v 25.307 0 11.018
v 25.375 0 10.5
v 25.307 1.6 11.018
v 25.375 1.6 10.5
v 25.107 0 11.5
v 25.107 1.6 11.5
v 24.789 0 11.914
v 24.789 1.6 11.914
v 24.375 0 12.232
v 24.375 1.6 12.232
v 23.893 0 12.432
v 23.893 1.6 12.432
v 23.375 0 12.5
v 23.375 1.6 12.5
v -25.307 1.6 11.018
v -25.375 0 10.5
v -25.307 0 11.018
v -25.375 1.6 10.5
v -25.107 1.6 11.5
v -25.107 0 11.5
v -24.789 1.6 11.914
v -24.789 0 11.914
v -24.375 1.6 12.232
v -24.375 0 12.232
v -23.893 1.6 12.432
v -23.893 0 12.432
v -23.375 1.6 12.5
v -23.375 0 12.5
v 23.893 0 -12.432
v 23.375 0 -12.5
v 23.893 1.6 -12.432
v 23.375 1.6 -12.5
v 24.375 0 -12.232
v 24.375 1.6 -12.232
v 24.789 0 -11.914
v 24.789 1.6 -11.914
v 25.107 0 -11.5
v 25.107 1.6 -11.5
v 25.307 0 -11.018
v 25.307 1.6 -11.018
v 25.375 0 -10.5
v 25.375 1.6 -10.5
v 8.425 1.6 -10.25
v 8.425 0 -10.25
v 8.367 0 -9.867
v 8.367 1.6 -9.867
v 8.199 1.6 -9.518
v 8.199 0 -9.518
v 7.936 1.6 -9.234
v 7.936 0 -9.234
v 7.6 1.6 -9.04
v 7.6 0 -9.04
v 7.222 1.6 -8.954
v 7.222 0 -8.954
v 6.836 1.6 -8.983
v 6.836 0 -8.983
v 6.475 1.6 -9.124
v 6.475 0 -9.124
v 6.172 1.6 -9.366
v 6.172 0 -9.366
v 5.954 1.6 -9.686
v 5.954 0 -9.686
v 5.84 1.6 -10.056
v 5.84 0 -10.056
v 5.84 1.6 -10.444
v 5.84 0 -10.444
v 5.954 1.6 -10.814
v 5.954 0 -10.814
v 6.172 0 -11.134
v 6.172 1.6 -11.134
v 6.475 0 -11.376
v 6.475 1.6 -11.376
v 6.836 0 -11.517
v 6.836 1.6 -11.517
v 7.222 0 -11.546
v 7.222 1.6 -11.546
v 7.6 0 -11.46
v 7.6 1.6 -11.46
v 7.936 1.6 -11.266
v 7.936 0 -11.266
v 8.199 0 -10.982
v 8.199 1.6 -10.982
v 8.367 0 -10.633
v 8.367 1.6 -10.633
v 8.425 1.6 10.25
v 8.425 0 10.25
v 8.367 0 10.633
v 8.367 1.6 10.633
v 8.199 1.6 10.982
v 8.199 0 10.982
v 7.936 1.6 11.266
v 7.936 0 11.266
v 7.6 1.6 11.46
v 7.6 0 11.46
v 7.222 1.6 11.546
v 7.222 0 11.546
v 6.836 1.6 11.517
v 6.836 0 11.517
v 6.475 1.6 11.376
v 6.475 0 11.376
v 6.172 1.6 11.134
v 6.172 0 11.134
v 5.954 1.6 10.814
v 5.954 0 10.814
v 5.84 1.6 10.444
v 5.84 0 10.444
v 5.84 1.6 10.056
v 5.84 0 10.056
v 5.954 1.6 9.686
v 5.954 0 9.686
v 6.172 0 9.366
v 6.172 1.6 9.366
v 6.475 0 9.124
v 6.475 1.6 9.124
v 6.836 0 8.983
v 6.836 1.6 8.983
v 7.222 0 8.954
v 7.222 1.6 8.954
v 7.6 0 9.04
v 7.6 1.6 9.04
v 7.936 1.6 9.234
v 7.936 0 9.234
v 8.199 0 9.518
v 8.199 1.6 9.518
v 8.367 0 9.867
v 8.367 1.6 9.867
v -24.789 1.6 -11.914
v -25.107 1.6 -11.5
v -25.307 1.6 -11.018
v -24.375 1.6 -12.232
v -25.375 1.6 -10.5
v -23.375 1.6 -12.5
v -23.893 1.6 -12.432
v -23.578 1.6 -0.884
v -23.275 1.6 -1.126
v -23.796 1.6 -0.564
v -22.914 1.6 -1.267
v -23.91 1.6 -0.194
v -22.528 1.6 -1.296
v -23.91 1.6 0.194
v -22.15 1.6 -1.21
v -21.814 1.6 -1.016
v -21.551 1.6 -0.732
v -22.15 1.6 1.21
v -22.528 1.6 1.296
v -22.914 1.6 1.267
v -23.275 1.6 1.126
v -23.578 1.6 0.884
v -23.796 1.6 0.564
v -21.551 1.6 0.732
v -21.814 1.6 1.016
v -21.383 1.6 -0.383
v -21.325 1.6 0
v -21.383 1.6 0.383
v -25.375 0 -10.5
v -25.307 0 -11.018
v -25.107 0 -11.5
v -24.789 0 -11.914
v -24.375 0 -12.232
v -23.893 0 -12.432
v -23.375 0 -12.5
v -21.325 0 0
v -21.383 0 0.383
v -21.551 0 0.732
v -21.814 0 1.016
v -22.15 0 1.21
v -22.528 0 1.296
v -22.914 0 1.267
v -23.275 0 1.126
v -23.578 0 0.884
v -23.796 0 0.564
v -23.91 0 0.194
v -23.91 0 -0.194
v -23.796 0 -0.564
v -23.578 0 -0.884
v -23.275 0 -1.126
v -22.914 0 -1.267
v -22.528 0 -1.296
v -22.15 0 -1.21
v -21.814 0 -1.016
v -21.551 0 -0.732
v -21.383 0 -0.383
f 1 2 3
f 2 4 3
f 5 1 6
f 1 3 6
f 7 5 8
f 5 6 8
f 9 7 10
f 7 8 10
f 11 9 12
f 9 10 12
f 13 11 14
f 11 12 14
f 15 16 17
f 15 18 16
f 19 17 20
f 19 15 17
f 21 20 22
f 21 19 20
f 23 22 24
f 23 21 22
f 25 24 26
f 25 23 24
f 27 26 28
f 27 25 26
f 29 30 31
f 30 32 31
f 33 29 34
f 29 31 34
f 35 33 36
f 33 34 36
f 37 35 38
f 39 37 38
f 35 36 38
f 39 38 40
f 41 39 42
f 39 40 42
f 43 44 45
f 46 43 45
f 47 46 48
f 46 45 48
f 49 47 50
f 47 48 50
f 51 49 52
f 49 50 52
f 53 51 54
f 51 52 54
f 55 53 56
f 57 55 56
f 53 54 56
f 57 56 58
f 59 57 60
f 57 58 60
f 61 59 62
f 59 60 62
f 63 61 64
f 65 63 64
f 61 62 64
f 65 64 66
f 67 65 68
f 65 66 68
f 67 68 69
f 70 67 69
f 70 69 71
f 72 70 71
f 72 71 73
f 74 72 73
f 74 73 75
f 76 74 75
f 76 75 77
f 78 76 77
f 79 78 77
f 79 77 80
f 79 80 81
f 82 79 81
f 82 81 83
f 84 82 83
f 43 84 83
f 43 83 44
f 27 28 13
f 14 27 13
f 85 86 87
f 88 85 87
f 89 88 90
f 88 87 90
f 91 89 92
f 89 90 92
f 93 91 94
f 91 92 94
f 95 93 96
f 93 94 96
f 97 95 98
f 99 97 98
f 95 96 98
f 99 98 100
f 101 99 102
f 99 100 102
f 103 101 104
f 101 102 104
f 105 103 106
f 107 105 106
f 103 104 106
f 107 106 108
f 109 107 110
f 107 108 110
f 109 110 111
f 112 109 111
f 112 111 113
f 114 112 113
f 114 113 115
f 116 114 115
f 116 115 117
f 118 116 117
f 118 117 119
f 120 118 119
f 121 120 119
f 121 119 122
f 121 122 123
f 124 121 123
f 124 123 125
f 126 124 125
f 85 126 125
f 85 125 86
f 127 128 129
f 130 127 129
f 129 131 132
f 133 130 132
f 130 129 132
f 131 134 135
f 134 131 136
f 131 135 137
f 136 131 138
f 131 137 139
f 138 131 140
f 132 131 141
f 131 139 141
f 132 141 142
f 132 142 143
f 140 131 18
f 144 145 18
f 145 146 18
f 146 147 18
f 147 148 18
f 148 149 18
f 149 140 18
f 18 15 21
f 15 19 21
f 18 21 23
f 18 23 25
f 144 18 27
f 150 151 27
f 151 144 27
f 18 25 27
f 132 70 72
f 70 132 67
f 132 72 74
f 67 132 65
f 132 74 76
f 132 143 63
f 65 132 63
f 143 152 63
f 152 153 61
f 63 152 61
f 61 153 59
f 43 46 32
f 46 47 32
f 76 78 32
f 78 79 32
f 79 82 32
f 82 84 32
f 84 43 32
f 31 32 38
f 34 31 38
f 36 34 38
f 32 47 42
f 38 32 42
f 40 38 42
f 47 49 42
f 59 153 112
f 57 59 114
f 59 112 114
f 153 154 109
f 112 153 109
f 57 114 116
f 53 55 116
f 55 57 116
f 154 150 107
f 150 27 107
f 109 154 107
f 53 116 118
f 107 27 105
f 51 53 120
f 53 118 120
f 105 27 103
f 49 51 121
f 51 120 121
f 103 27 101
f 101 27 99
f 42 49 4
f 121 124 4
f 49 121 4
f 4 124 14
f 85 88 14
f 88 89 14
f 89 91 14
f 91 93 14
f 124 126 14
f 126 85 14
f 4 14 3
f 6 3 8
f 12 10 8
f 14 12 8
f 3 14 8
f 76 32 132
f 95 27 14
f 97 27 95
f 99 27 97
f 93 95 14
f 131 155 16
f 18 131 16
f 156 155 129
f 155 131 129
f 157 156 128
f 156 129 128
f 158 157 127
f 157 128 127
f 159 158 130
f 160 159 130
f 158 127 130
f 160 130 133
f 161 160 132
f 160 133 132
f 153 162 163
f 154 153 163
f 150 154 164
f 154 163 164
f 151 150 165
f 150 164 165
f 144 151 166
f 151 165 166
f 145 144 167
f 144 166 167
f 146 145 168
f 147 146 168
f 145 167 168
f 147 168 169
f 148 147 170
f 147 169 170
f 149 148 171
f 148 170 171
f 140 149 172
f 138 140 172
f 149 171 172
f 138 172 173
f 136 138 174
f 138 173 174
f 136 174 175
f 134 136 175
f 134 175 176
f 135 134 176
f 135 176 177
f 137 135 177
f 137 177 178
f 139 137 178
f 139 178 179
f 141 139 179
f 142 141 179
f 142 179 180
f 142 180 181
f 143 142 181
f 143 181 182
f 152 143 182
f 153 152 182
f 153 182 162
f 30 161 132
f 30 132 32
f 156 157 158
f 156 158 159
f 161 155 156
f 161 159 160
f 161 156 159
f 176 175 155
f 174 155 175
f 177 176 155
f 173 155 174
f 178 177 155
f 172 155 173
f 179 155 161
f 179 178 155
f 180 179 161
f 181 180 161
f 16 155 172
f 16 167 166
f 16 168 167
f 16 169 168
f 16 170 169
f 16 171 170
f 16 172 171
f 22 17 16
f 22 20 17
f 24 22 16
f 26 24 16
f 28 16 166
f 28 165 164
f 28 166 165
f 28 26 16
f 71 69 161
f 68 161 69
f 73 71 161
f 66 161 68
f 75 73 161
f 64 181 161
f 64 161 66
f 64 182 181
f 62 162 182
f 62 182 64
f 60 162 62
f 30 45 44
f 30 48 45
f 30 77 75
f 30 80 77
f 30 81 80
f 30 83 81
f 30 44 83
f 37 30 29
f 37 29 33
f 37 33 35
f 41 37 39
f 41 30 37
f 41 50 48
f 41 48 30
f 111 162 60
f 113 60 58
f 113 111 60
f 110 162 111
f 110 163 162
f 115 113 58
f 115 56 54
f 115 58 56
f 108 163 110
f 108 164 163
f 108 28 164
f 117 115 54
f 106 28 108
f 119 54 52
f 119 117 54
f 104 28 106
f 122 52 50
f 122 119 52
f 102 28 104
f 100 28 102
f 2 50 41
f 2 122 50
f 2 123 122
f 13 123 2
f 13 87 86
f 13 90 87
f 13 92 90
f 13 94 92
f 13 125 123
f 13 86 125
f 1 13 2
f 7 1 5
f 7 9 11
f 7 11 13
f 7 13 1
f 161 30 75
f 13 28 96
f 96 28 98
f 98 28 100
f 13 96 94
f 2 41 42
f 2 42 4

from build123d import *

# Parameters (mm, degrees)
SKETCH_W     = 50.75
SKETCH_H     = 25
PAD_DEPTH    = 1.6
FILLET_R     = 2
SKETCH001_R  = 1.3
POCKET_DEPTH = 1.601


with BuildPart() as part:
    # Sketch → Pad (new body)
    with BuildSketch(Plane.XZ):
        Rectangle(SKETCH_W, SKETCH_H)
    extrude(amount=-PAD_DEPTH)

    # Fillet
    fillet_edges = [part.edges().sort_by_distance(p)[0] for p in [
        (25.375, 0.8, 12.5),
        (-25.375, 0.8, 12.5),
        (-25.375, 0.8, -12.5),
        (25.375, 0.8, -12.5),
    ]]
    fillet(fillet_edges, radius=FILLET_R)

    # Sketch001 → Pocket (cut, through all)
    with BuildSketch(Plane.XZ):
        with Locations((-22.625, 0)):
            Circle(SKETCH001_R)
        with Locations((7.125, 10.25)):
            Circle(SKETCH001_R)
        with Locations((7.125, -10.25)):
            Circle(SKETCH001_R)
    extrude(amount=-POCKET_DEPTH, mode=Mode.SUBTRACT)


solid = part.part
